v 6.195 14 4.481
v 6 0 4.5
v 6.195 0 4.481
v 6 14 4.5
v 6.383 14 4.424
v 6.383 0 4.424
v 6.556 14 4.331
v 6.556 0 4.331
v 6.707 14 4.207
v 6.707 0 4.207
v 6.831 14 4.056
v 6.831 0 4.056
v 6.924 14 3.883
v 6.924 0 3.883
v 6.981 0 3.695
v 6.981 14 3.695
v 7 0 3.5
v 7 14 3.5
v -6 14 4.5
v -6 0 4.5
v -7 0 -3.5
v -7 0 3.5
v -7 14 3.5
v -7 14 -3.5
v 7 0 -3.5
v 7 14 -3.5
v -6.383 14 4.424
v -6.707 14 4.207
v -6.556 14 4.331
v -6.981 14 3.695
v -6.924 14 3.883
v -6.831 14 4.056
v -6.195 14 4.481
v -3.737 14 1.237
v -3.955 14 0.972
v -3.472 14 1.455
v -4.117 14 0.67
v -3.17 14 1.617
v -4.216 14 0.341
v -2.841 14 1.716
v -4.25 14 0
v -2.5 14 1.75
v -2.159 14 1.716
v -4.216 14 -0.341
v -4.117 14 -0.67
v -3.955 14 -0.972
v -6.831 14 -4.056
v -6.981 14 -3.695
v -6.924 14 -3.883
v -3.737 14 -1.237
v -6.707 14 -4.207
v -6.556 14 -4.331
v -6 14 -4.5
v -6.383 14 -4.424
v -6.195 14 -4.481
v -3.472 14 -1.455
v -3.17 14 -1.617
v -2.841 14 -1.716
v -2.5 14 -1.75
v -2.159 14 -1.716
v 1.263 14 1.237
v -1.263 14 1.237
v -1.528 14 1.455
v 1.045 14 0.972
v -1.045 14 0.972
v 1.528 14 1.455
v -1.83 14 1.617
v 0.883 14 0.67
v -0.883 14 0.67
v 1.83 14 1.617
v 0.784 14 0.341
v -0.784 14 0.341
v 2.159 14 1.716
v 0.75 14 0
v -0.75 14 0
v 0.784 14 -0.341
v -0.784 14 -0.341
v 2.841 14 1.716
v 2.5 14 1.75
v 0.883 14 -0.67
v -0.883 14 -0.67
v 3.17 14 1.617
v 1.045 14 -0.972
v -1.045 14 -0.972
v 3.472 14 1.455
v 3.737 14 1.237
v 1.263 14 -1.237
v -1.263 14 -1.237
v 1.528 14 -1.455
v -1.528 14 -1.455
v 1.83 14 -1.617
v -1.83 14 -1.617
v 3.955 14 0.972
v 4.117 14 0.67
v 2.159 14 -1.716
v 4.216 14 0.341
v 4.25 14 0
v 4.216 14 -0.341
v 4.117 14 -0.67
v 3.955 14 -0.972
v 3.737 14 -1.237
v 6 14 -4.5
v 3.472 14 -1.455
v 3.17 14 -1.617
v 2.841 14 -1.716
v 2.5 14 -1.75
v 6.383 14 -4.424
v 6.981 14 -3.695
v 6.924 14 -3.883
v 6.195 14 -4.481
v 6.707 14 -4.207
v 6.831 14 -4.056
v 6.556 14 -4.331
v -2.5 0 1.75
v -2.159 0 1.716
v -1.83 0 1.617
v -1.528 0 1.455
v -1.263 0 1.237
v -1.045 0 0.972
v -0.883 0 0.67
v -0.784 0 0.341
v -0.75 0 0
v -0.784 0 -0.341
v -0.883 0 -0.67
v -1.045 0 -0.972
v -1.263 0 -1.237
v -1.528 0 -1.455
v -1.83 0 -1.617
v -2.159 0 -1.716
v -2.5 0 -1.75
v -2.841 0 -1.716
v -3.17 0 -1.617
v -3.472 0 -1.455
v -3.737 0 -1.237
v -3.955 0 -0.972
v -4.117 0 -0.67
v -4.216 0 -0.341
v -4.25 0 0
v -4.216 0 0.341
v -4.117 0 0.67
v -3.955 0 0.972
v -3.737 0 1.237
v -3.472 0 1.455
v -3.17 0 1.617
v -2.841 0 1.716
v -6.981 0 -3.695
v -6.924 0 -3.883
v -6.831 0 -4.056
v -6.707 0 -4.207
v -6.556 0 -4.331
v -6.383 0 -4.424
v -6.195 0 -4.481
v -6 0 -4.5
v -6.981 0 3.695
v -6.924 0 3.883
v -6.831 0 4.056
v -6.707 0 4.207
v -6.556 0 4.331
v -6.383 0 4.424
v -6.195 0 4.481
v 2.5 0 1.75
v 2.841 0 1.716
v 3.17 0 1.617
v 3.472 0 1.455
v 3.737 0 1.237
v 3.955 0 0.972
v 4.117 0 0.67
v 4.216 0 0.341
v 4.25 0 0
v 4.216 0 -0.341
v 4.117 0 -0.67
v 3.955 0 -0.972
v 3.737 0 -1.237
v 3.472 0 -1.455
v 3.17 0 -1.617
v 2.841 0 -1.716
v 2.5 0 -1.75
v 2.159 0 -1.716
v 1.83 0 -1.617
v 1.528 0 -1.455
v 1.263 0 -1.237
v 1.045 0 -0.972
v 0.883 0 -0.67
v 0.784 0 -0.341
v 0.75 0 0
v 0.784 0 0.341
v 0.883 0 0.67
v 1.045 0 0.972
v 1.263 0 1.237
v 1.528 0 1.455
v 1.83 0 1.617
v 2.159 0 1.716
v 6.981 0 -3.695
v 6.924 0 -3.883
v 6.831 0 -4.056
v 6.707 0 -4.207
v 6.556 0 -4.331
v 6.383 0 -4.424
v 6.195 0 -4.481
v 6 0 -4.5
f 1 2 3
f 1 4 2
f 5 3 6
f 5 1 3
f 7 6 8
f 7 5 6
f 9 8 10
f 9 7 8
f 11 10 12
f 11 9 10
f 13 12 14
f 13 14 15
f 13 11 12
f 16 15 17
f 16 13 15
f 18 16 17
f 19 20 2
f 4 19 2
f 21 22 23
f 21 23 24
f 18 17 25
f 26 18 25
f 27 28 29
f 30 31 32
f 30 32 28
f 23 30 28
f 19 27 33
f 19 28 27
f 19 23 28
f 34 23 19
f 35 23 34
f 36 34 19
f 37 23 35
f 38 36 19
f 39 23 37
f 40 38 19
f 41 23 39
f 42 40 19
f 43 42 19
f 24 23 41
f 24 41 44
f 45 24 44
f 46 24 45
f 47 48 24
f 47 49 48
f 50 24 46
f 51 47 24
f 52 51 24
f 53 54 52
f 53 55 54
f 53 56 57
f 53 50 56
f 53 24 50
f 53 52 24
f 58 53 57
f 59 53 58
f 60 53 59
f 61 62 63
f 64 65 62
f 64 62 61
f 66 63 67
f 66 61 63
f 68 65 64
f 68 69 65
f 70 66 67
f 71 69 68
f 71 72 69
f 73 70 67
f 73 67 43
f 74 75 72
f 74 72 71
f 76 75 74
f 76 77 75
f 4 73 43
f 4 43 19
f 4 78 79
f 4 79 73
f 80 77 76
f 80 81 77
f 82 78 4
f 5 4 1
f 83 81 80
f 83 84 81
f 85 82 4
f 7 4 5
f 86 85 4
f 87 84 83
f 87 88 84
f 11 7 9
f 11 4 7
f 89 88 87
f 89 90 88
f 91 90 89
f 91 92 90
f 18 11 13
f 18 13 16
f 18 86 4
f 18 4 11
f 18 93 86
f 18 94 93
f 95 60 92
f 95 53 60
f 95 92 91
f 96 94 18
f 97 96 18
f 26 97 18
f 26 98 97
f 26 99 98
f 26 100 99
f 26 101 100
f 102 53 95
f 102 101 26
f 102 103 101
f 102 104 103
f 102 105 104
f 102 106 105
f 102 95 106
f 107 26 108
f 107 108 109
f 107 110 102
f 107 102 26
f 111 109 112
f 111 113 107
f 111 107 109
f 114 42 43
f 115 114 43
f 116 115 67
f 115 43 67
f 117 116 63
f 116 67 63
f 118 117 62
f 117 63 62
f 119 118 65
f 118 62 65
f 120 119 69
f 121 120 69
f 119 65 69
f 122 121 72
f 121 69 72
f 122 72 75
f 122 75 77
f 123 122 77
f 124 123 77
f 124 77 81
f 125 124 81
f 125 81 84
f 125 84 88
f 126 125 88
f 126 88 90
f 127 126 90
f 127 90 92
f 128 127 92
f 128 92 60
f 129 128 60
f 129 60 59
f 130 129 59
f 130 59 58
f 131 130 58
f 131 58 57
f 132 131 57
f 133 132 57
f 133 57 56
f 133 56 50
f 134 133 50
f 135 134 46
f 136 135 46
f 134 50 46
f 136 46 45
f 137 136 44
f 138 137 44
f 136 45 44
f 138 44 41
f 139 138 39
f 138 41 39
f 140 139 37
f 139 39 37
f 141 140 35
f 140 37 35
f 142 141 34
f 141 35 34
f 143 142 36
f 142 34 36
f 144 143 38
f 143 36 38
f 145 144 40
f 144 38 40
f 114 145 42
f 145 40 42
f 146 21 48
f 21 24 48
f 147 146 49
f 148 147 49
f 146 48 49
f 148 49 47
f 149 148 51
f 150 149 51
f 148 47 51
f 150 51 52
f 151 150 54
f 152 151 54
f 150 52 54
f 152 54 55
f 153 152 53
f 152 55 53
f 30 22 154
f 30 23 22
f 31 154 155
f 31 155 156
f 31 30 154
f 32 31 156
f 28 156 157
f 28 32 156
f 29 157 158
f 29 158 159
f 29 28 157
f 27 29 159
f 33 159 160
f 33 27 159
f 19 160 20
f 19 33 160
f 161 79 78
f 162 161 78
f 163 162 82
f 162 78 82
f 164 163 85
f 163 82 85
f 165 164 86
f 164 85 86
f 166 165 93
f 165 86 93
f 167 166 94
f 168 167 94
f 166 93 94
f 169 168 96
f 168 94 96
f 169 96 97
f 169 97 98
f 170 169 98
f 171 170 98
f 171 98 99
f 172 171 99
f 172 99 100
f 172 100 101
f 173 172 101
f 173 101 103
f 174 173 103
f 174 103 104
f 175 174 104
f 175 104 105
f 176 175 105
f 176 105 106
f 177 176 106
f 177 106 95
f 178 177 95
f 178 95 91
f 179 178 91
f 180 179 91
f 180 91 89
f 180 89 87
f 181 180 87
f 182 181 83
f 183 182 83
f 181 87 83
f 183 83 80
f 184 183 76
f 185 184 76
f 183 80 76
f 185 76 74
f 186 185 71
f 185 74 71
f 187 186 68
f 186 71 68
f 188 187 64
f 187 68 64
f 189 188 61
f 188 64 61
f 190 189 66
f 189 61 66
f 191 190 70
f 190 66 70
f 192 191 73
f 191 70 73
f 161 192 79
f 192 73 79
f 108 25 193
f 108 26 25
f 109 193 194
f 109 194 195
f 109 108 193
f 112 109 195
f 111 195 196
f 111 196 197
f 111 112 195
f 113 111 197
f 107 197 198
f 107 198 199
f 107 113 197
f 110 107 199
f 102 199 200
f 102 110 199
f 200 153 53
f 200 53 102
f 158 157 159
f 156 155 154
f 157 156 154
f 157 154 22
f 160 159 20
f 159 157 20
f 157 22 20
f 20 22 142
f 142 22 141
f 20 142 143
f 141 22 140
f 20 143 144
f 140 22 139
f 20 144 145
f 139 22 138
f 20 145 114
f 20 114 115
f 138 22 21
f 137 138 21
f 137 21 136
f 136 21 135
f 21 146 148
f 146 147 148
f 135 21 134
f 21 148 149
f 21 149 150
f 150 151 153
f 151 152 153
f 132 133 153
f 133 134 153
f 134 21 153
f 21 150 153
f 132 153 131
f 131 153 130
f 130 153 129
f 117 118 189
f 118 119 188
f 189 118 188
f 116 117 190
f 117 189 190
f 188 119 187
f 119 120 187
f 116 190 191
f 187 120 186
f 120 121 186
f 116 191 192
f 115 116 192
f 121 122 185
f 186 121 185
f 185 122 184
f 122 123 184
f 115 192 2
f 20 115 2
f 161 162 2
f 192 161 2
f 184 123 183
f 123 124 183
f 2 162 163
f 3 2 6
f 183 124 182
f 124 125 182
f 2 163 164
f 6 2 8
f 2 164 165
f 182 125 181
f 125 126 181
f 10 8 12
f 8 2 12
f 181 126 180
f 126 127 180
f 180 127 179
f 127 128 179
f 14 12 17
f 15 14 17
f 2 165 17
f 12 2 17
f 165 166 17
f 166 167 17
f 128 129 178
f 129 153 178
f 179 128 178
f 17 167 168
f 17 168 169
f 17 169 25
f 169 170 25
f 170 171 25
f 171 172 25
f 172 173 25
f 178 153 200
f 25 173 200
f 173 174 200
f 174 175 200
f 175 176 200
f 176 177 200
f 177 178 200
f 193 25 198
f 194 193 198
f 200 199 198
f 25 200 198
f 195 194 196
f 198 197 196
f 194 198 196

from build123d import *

# Parameters (mm, degrees)
SKETCH_1_W          = 14
SKETCH_1_H          = 9
EXTRUDE_1_DEPTH     = 14
FILLET_1_R          = 1
CUT_EXTRUDE_2_REACH = 18.286
SKETCH_3_R          = 1.75


with BuildPart() as part:
    # 草图1 → 凸台-拉伸1 (new body)
    with BuildSketch(Plane(origin=(0, 0, 0), x_dir=(1, 0, 0), z_dir=(0, 1, 0))):
        Rectangle(SKETCH_1_W, SKETCH_1_H)
    extrude(amount=EXTRUDE_1_DEPTH)

    # 圆角1
    fillet_1_edges = [part.edges().sort_by_distance(p)[0] for p in [
        (7, 7, 4.5),
        (-7, 7, 4.5),
        (-7, 7, -4.5),
        (7, 7, -4.5),
    ]]
    fillet(fillet_1_edges, radius=FILLET_1_R)

    # 草图3 → 切除-拉伸2 (cut, up to next)
    with BuildSketch(Plane(origin=(0, 14, 0), x_dir=(1, 0, 0), z_dir=(0, 1, 0)), mode=Mode.PRIVATE) as cut_extrude_2_sk1:
        with Locations(Location((-2.5, 0, 0), (0, 0, 270))):
            Circle(SKETCH_3_R)
    cut_extrude_2_tool1 = extrude(cut_extrude_2_sk1.sketch, amount=-CUT_EXTRUDE_2_REACH, mode=Mode.PRIVATE) & part.part
    # 草图3 → 切除-拉伸2 (cut, up to next)
    with BuildSketch(Plane(origin=(0, 14, 0), x_dir=(1, 0, 0), z_dir=(0, 1, 0)), mode=Mode.PRIVATE) as cut_extrude_2_sk2:
        with Locations(Location((2.5, 0, 0), (0, 0, 270))):
            Circle(SKETCH_3_R)
    cut_extrude_2_tool2 = extrude(cut_extrude_2_sk2.sketch, amount=-CUT_EXTRUDE_2_REACH, mode=Mode.PRIVATE) & part.part
    add(cut_extrude_2_tool1.solids().sort_by_distance((-2.5, 14, 0))[0], mode=Mode.SUBTRACT)
    add(cut_extrude_2_tool2.solids().sort_by_distance((2.5, 14, 0))[0], mode=Mode.SUBTRACT)


solid = part.part
